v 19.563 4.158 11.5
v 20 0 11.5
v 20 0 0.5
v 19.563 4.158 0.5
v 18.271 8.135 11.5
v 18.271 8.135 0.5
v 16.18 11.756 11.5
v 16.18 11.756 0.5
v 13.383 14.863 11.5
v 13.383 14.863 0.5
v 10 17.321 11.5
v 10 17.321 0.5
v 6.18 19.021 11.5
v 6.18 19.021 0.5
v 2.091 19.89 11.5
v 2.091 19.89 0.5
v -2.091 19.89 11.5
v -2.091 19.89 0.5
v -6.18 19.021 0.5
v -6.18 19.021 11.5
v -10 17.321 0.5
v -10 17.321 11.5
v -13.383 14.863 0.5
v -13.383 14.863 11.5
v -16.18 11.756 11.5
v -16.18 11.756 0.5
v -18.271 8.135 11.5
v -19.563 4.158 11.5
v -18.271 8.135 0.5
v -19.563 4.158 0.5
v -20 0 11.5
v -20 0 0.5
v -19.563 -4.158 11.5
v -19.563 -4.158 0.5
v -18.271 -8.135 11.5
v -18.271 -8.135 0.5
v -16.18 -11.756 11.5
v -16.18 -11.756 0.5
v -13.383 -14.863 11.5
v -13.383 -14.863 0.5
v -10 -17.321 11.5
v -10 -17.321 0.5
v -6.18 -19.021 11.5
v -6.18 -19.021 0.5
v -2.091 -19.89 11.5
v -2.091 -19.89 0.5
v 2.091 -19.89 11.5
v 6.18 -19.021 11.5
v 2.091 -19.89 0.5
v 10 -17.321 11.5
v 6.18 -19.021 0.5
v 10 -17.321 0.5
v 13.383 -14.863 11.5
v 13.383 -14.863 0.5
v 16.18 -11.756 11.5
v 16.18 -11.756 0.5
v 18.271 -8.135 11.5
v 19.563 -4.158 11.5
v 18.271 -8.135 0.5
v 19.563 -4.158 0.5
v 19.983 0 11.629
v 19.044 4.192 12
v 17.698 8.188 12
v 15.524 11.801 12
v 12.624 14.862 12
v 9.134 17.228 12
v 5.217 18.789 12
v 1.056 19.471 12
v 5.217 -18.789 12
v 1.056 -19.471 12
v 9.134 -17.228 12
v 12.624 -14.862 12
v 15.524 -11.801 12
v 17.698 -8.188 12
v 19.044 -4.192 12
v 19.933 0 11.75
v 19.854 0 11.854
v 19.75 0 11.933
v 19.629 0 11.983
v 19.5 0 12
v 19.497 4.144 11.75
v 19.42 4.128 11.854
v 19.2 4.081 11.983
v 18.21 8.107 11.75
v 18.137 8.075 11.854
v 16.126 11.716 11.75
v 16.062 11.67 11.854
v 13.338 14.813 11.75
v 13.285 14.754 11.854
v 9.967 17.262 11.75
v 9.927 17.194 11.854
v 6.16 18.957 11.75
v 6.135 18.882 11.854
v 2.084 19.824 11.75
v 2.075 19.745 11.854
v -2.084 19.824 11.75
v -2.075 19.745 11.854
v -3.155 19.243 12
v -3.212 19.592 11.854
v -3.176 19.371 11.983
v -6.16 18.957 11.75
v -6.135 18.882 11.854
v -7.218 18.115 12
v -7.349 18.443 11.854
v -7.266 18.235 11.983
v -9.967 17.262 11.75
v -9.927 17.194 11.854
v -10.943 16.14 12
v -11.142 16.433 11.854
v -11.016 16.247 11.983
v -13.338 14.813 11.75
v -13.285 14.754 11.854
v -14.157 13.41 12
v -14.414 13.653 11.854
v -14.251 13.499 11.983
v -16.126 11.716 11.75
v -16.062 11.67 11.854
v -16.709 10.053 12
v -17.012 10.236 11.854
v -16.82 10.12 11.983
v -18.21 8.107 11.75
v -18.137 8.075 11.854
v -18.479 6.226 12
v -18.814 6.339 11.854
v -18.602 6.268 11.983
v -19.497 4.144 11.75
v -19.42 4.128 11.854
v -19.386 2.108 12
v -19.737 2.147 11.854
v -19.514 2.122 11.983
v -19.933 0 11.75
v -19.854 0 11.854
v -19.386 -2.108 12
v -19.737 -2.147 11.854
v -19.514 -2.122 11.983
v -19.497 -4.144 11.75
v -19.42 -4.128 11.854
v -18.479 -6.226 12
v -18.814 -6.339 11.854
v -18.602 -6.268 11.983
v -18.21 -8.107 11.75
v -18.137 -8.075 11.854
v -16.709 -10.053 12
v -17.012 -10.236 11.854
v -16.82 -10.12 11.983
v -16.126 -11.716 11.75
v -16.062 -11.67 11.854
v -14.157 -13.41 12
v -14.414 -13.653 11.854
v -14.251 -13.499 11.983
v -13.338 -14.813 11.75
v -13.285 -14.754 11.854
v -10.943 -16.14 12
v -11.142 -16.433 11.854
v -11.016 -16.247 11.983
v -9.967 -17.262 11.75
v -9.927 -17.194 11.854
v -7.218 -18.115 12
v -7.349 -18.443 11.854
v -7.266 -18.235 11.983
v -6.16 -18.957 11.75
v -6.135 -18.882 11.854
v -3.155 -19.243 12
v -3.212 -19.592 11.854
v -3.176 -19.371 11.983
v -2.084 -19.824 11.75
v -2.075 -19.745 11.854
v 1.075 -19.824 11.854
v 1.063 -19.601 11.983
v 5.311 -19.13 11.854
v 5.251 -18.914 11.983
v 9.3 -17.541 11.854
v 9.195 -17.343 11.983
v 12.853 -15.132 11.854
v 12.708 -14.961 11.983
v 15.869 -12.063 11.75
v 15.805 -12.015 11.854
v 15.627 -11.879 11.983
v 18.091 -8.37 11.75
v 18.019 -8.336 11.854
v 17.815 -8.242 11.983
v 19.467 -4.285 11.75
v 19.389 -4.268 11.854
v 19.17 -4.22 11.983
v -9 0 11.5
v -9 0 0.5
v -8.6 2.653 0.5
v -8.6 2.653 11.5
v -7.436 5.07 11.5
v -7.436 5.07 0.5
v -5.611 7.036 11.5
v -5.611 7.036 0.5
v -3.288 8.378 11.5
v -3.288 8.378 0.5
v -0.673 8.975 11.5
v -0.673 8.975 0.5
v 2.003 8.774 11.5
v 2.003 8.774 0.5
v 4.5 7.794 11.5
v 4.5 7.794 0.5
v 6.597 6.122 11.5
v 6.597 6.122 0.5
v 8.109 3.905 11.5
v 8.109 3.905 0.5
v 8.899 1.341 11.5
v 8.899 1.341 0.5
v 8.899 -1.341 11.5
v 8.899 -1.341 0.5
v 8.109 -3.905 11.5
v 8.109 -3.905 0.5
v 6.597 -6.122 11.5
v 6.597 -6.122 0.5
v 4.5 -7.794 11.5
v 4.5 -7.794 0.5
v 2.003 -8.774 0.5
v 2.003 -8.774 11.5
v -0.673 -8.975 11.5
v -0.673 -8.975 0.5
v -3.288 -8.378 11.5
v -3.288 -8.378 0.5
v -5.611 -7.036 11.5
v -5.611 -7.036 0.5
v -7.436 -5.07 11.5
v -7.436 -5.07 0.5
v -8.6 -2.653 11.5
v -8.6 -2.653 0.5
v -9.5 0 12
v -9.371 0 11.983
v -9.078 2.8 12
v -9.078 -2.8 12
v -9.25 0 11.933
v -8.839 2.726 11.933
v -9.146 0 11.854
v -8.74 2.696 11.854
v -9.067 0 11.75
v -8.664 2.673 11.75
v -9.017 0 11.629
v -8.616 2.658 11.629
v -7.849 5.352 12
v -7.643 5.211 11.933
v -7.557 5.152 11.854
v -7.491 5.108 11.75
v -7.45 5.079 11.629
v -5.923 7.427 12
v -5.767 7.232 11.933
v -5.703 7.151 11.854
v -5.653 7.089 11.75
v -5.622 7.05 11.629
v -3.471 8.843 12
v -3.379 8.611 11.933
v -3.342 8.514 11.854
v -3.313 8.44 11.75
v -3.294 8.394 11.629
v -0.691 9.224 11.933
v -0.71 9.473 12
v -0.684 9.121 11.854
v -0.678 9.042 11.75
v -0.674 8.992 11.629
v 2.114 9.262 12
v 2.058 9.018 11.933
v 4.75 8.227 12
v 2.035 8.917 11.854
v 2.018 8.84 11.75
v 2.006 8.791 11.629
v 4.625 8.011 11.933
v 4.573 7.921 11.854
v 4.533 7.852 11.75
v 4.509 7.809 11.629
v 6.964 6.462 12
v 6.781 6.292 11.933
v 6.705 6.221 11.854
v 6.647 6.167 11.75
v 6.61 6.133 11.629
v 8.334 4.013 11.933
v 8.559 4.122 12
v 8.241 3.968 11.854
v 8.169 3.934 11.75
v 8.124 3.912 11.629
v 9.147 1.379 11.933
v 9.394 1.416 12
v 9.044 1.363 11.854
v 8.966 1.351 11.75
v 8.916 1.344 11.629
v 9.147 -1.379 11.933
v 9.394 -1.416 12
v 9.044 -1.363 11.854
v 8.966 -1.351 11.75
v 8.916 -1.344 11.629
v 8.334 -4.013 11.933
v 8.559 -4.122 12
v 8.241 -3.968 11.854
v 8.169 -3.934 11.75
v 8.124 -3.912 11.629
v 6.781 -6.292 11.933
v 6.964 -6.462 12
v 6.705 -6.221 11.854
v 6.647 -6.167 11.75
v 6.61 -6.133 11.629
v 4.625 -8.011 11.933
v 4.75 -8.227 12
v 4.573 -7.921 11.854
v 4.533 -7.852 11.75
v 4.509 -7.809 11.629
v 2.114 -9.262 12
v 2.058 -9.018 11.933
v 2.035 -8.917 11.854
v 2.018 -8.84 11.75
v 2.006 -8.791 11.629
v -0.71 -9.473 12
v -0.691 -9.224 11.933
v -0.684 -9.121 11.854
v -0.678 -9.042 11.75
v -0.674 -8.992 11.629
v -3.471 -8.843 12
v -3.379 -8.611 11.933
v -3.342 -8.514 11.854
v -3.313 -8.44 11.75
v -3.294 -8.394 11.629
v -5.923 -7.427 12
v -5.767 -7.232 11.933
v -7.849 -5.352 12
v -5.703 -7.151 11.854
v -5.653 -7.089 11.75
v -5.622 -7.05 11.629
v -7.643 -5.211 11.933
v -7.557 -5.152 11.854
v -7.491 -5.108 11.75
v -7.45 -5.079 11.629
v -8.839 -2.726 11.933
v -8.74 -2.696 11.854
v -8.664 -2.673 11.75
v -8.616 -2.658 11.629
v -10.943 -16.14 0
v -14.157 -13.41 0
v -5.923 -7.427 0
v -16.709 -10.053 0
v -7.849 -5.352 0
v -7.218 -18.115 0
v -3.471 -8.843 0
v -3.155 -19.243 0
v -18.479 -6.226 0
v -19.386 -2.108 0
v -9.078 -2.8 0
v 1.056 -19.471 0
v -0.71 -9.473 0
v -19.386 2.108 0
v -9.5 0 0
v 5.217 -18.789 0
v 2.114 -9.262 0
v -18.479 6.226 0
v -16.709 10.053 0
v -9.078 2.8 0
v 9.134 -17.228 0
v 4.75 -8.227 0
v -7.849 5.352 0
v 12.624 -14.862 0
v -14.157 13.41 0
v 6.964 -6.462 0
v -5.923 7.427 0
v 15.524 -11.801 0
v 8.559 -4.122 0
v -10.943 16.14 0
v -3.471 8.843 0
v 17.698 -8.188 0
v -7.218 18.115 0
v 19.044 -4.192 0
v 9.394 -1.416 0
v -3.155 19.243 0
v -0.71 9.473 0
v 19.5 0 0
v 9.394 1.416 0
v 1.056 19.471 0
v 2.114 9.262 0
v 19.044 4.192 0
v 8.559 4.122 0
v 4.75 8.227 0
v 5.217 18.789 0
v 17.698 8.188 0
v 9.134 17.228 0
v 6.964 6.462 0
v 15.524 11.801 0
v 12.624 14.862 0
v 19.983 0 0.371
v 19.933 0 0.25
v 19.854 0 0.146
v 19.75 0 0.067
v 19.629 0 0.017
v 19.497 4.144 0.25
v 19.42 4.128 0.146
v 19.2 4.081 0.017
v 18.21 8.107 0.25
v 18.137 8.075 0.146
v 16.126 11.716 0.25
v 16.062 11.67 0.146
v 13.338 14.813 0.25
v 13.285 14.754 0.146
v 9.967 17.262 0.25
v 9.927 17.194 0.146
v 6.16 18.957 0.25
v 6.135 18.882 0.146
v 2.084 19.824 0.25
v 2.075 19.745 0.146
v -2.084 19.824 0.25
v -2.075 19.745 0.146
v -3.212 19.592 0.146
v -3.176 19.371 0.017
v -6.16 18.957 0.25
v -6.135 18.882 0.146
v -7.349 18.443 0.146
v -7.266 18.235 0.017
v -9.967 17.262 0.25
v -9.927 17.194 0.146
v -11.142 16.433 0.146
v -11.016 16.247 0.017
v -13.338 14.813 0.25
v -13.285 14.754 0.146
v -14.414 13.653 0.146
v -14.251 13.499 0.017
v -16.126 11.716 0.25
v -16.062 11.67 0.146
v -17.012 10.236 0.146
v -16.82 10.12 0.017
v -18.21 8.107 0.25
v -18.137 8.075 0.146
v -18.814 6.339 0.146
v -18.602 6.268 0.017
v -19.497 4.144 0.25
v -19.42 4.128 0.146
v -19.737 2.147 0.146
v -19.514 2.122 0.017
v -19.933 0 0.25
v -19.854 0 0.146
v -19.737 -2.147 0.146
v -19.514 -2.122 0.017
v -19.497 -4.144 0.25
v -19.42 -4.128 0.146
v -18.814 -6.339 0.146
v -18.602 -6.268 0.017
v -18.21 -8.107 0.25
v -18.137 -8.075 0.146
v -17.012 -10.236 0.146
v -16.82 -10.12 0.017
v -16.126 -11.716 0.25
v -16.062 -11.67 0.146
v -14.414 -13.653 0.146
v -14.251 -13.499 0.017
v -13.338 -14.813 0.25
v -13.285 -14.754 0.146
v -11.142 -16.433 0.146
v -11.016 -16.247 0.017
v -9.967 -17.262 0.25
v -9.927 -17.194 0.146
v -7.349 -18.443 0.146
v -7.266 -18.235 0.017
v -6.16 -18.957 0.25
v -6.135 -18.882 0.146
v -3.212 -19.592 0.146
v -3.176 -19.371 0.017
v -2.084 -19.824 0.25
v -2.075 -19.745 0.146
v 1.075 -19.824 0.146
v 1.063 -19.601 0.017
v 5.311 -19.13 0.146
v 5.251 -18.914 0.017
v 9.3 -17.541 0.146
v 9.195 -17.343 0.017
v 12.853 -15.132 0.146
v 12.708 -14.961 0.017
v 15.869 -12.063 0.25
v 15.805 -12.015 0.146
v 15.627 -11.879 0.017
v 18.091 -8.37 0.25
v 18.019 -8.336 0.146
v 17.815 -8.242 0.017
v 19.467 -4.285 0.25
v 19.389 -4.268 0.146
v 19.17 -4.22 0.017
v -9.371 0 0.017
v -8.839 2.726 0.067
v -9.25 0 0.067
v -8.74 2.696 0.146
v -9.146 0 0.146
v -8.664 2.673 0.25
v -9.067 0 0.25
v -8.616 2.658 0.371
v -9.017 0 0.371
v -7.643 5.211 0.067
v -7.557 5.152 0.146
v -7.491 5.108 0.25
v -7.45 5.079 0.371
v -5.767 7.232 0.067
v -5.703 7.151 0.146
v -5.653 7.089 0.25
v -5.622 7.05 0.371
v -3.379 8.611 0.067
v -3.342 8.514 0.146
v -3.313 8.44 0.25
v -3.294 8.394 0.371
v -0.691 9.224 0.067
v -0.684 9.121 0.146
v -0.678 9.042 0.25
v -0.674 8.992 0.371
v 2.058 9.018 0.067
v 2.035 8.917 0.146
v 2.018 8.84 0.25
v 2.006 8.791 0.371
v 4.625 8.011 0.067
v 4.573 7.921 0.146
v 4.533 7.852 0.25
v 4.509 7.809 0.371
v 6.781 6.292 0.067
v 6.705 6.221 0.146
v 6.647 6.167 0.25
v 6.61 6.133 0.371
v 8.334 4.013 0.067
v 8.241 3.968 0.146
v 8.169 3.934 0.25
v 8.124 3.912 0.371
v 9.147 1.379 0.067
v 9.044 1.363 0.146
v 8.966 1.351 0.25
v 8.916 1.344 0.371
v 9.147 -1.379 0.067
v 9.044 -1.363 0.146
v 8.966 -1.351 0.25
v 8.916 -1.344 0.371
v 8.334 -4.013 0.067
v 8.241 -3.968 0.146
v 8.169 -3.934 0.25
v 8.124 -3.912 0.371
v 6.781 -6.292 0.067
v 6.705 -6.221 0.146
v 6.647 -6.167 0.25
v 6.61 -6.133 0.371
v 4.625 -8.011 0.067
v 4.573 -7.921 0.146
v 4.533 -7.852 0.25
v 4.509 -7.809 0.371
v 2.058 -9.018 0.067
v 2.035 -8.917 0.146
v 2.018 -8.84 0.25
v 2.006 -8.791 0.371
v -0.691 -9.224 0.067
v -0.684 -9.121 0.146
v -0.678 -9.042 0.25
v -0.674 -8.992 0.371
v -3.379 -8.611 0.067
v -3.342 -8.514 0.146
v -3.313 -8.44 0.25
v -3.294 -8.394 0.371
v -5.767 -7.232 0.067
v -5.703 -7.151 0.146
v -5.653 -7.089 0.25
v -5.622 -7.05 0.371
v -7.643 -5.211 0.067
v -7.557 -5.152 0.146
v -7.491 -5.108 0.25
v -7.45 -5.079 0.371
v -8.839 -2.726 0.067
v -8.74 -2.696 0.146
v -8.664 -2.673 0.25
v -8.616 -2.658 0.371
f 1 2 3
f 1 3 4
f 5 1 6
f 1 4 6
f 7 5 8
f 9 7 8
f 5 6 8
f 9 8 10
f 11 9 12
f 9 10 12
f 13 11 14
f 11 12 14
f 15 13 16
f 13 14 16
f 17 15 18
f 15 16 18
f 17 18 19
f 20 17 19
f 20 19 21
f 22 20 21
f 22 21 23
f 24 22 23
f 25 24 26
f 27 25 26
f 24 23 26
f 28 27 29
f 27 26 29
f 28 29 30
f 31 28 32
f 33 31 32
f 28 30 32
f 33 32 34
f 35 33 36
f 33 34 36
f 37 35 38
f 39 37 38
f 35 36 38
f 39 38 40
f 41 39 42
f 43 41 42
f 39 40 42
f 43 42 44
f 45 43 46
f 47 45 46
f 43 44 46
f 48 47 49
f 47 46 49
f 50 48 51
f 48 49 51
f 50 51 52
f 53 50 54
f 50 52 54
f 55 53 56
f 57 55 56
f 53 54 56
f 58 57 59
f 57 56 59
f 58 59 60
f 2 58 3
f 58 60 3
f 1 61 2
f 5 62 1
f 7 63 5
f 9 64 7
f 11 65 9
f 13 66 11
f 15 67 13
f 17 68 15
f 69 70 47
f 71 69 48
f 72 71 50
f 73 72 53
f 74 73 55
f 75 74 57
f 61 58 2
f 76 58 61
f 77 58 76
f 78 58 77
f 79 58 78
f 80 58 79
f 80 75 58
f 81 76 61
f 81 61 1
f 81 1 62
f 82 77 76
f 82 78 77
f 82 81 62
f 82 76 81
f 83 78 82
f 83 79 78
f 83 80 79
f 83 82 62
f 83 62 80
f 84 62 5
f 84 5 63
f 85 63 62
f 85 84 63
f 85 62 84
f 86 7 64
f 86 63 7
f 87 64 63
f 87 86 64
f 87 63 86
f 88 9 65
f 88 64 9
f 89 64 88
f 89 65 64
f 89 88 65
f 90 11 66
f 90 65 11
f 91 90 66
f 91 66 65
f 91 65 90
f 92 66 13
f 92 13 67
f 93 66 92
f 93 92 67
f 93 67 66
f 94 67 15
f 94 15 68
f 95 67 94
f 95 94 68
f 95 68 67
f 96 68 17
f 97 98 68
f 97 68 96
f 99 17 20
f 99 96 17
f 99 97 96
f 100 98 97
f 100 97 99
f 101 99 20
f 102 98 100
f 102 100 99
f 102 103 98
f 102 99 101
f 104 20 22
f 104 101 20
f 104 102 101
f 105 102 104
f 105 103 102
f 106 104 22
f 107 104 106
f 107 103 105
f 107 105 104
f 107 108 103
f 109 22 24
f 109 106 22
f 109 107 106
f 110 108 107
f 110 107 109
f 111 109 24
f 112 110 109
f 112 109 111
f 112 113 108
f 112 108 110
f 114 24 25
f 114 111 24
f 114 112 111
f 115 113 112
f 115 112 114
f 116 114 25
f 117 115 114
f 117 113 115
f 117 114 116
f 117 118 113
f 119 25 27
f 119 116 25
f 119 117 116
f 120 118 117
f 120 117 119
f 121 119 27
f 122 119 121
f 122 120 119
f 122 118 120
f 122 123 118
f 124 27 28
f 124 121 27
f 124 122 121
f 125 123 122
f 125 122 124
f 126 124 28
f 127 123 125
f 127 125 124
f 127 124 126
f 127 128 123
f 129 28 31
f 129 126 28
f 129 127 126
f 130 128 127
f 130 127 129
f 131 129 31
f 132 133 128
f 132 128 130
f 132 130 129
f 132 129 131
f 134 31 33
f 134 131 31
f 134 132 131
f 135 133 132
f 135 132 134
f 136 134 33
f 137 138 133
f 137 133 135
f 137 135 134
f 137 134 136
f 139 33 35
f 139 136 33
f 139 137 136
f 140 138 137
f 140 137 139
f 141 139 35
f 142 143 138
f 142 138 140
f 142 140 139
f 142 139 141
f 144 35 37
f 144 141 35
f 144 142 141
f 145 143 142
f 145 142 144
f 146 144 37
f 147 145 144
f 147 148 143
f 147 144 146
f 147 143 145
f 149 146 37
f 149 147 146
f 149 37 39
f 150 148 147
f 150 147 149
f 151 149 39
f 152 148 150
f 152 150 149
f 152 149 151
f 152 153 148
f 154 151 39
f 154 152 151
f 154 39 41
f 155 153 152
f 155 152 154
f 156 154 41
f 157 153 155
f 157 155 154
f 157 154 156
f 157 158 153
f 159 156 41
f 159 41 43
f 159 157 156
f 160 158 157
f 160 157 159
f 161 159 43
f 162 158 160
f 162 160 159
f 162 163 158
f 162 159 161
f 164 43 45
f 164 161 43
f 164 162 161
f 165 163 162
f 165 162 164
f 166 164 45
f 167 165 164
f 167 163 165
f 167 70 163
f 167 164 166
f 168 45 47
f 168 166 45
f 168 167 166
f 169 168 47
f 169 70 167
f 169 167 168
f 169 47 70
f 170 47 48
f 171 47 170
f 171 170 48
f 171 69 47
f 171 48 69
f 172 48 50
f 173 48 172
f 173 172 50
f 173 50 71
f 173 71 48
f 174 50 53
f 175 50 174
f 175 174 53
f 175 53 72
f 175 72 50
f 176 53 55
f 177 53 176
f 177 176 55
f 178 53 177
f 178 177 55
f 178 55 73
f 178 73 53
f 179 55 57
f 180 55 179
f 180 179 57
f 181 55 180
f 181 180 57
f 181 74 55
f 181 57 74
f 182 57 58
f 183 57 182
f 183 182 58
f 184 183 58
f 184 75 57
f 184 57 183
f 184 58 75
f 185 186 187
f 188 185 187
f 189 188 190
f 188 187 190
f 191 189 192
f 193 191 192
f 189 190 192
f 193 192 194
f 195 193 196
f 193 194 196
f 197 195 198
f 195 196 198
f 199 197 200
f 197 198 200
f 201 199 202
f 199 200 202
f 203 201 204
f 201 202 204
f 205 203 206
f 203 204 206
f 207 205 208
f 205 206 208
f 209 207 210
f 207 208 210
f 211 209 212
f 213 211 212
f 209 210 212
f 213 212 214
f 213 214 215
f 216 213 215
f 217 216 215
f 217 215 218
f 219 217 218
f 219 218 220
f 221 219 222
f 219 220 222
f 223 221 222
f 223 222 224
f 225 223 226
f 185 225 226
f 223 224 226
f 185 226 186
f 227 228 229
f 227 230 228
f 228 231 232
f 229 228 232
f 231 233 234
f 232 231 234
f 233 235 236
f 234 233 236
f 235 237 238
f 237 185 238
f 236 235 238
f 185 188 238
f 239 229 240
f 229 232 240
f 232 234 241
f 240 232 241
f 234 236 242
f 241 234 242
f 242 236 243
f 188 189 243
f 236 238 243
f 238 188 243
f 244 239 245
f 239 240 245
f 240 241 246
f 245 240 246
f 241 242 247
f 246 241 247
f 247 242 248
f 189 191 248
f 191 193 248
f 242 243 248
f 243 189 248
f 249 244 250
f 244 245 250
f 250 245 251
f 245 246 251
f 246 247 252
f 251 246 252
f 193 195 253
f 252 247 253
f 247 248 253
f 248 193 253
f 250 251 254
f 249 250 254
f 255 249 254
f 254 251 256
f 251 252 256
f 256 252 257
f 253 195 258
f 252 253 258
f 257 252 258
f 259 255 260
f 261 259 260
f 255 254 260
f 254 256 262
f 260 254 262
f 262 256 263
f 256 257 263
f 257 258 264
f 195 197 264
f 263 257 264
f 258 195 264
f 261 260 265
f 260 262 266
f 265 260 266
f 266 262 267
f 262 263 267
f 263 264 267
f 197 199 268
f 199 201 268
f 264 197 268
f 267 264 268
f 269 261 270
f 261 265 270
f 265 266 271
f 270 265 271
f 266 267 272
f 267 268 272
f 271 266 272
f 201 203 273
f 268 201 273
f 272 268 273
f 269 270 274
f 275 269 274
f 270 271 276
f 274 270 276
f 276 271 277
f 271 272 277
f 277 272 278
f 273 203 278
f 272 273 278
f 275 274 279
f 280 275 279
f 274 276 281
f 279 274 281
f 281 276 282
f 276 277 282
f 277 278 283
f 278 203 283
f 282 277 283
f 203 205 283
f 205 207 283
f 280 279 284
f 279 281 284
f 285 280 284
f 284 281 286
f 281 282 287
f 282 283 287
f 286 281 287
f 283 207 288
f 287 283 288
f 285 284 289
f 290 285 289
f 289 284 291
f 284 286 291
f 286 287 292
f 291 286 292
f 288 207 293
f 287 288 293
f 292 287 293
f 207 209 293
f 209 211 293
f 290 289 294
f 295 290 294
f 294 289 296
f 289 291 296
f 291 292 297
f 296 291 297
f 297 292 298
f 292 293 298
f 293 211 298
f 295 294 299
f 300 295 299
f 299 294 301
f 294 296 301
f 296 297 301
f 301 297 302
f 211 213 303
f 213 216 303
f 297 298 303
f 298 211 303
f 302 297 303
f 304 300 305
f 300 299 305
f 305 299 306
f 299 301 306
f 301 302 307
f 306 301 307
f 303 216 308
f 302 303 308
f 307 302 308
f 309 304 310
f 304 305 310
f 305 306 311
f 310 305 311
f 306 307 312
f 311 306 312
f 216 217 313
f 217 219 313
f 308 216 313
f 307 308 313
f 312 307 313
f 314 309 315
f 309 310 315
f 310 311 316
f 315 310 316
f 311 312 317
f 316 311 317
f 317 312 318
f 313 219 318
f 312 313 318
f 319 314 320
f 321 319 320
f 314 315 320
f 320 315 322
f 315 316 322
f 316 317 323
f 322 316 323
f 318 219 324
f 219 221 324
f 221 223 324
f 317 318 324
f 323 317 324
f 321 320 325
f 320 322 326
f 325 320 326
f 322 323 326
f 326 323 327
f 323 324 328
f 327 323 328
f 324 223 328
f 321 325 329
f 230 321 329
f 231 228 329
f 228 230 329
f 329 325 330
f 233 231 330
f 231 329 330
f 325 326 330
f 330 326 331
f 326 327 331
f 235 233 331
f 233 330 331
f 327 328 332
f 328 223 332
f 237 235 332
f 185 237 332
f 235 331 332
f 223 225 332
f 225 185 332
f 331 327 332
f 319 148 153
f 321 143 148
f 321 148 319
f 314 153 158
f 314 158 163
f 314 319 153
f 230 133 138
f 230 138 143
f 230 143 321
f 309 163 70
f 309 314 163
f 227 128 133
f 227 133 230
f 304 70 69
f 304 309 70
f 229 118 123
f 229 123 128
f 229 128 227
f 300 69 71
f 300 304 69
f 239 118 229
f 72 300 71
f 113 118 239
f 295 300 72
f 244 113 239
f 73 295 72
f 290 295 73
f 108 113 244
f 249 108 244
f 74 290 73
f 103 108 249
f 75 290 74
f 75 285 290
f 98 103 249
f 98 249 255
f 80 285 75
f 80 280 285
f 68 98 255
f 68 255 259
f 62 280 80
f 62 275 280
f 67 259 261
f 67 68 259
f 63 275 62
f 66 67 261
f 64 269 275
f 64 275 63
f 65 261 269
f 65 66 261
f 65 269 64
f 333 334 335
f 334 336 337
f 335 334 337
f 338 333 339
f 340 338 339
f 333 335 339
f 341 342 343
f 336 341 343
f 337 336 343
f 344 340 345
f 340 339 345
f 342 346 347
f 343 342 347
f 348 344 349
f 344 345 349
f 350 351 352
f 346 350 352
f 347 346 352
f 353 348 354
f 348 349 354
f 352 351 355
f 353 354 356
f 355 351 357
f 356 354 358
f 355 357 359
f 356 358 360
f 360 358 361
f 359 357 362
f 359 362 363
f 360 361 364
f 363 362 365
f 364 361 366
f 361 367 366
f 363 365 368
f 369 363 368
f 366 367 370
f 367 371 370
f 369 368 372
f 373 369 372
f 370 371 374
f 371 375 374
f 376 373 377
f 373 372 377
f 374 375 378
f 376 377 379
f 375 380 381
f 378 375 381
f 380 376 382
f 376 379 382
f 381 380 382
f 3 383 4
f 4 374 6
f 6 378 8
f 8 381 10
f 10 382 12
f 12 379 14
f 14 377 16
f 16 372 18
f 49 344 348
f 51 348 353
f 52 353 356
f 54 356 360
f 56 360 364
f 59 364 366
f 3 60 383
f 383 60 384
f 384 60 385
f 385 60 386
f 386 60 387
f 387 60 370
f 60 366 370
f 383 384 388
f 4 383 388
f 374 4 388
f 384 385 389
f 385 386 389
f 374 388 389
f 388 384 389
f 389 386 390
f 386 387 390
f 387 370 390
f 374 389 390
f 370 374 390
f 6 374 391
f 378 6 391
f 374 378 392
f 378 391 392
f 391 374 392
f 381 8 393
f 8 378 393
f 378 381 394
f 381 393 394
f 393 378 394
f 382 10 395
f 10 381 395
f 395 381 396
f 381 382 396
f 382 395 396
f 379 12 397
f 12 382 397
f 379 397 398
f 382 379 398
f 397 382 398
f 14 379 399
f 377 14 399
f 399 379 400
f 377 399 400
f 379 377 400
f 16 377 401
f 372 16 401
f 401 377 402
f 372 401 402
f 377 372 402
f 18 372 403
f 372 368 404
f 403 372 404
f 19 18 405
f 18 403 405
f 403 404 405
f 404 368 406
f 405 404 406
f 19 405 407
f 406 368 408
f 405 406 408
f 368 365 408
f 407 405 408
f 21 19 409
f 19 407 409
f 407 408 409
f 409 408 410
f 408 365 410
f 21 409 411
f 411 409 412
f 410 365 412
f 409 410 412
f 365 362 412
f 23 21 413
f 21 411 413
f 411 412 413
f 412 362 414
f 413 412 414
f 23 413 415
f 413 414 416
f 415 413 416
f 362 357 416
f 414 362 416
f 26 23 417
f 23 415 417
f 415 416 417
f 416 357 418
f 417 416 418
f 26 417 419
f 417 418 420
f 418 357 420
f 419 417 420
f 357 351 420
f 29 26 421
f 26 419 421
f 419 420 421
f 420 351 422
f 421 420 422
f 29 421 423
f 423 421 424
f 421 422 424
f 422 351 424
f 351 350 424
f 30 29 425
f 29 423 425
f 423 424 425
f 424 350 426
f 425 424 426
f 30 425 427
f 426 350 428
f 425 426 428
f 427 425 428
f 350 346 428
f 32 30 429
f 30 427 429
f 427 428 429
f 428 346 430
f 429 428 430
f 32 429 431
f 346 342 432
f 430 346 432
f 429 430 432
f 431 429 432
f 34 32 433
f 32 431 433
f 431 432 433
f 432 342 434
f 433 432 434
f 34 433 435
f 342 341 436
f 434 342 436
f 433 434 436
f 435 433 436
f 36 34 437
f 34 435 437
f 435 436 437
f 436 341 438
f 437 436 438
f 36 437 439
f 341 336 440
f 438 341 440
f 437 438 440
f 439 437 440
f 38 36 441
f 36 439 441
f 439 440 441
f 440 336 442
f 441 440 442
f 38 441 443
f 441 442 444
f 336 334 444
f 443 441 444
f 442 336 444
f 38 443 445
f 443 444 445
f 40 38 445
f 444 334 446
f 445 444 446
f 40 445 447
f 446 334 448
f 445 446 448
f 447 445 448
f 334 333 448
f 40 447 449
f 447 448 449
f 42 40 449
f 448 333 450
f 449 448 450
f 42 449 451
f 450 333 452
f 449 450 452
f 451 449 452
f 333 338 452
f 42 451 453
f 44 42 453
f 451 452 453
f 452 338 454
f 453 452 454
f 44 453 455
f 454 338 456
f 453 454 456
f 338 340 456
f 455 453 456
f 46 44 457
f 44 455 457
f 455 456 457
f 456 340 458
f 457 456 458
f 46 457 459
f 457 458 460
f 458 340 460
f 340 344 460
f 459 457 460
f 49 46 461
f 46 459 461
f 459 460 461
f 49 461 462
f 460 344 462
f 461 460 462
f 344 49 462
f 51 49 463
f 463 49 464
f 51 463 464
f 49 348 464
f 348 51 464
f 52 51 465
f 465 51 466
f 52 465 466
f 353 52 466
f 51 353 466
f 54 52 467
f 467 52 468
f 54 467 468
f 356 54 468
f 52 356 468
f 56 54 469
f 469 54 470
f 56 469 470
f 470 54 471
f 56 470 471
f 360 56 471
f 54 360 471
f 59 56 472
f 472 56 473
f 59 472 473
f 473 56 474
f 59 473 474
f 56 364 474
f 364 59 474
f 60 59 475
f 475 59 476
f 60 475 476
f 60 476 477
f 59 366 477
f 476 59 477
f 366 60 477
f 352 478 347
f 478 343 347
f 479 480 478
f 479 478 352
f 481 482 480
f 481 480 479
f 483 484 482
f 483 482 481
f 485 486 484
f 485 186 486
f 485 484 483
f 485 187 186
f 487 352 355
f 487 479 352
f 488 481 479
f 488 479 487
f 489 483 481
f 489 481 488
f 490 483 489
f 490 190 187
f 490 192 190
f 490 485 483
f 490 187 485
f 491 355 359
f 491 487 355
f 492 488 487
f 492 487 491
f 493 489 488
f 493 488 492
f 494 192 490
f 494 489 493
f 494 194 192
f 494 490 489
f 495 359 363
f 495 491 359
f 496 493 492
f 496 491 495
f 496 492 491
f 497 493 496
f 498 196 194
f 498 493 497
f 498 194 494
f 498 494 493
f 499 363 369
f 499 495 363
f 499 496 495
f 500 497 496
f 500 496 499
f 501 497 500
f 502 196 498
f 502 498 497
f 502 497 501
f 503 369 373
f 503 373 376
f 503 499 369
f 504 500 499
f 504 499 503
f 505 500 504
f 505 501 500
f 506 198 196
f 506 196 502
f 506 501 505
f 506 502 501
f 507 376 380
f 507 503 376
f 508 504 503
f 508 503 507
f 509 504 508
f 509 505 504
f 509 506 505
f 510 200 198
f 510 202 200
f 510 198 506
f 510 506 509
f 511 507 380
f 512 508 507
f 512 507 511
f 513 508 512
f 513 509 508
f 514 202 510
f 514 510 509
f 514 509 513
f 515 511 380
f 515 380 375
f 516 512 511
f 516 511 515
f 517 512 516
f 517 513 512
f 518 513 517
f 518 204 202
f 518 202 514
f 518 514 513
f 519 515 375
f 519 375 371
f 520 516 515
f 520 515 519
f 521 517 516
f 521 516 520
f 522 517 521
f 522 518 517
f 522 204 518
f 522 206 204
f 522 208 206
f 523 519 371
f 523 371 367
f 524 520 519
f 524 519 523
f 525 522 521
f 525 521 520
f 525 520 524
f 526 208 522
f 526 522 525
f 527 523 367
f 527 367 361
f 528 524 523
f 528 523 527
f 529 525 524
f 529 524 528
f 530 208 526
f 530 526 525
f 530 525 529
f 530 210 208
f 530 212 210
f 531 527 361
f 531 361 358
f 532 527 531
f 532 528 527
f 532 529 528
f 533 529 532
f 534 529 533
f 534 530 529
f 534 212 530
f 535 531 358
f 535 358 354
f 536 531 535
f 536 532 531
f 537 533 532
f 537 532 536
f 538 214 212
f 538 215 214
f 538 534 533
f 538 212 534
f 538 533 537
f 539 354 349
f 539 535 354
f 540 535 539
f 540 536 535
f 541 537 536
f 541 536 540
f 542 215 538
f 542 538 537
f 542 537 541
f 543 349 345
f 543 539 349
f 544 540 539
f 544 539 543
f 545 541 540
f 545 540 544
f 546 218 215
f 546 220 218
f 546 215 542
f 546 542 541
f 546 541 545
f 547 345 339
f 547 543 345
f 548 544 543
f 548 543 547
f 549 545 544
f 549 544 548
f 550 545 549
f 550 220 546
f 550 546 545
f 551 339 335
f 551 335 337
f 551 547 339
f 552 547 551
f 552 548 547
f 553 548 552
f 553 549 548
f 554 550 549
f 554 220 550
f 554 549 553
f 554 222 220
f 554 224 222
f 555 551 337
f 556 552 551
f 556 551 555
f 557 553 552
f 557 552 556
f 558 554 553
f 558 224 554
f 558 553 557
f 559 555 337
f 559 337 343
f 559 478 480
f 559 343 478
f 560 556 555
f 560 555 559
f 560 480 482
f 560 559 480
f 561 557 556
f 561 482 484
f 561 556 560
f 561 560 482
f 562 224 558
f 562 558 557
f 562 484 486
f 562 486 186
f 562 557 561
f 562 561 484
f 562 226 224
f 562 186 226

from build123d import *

# Parameters (mm, degrees)
SZKIC1_R                    = 20
DODANIE_WYCI_GNI_CIE1_DEPTH = 12
SZKIC4_R                    = 9
WYTNIJ_WYCI_GNI_CIE1_DEPTH  = 12
ZAOKR_GLENIE1_R             = 0.5


with BuildPart() as part:
    # Szkic1 → Dodanie-wyciągnięcie1 (new body)
    with BuildSketch(Plane.XY):
        Circle(SZKIC1_R)
    extrude(amount=DODANIE_WYCI_GNI_CIE1_DEPTH)

    # Szkic4 → Wytnij-wyciągnięcie1 (cut)
    with BuildSketch(Plane(origin=(0, 0, 0), x_dir=(-1, 0, 0), z_dir=(0, 0, -1))):
        Circle(SZKIC4_R)
    extrude(amount=-WYTNIJ_WYCI_GNI_CIE1_DEPTH, mode=Mode.SUBTRACT)

    # Zaokrąglenie1
    zaokr_glenie1_edges = [part.edges().sort_by_distance(p)[0] for p in [
        (-20, 0, 0),
        (-20, 0, 12),
        (9, 0, 12),
        (9, 0, 0),
    ]]
    fillet(zaokr_glenie1_edges, radius=ZAOKR_GLENIE1_R)


solid = part.part
